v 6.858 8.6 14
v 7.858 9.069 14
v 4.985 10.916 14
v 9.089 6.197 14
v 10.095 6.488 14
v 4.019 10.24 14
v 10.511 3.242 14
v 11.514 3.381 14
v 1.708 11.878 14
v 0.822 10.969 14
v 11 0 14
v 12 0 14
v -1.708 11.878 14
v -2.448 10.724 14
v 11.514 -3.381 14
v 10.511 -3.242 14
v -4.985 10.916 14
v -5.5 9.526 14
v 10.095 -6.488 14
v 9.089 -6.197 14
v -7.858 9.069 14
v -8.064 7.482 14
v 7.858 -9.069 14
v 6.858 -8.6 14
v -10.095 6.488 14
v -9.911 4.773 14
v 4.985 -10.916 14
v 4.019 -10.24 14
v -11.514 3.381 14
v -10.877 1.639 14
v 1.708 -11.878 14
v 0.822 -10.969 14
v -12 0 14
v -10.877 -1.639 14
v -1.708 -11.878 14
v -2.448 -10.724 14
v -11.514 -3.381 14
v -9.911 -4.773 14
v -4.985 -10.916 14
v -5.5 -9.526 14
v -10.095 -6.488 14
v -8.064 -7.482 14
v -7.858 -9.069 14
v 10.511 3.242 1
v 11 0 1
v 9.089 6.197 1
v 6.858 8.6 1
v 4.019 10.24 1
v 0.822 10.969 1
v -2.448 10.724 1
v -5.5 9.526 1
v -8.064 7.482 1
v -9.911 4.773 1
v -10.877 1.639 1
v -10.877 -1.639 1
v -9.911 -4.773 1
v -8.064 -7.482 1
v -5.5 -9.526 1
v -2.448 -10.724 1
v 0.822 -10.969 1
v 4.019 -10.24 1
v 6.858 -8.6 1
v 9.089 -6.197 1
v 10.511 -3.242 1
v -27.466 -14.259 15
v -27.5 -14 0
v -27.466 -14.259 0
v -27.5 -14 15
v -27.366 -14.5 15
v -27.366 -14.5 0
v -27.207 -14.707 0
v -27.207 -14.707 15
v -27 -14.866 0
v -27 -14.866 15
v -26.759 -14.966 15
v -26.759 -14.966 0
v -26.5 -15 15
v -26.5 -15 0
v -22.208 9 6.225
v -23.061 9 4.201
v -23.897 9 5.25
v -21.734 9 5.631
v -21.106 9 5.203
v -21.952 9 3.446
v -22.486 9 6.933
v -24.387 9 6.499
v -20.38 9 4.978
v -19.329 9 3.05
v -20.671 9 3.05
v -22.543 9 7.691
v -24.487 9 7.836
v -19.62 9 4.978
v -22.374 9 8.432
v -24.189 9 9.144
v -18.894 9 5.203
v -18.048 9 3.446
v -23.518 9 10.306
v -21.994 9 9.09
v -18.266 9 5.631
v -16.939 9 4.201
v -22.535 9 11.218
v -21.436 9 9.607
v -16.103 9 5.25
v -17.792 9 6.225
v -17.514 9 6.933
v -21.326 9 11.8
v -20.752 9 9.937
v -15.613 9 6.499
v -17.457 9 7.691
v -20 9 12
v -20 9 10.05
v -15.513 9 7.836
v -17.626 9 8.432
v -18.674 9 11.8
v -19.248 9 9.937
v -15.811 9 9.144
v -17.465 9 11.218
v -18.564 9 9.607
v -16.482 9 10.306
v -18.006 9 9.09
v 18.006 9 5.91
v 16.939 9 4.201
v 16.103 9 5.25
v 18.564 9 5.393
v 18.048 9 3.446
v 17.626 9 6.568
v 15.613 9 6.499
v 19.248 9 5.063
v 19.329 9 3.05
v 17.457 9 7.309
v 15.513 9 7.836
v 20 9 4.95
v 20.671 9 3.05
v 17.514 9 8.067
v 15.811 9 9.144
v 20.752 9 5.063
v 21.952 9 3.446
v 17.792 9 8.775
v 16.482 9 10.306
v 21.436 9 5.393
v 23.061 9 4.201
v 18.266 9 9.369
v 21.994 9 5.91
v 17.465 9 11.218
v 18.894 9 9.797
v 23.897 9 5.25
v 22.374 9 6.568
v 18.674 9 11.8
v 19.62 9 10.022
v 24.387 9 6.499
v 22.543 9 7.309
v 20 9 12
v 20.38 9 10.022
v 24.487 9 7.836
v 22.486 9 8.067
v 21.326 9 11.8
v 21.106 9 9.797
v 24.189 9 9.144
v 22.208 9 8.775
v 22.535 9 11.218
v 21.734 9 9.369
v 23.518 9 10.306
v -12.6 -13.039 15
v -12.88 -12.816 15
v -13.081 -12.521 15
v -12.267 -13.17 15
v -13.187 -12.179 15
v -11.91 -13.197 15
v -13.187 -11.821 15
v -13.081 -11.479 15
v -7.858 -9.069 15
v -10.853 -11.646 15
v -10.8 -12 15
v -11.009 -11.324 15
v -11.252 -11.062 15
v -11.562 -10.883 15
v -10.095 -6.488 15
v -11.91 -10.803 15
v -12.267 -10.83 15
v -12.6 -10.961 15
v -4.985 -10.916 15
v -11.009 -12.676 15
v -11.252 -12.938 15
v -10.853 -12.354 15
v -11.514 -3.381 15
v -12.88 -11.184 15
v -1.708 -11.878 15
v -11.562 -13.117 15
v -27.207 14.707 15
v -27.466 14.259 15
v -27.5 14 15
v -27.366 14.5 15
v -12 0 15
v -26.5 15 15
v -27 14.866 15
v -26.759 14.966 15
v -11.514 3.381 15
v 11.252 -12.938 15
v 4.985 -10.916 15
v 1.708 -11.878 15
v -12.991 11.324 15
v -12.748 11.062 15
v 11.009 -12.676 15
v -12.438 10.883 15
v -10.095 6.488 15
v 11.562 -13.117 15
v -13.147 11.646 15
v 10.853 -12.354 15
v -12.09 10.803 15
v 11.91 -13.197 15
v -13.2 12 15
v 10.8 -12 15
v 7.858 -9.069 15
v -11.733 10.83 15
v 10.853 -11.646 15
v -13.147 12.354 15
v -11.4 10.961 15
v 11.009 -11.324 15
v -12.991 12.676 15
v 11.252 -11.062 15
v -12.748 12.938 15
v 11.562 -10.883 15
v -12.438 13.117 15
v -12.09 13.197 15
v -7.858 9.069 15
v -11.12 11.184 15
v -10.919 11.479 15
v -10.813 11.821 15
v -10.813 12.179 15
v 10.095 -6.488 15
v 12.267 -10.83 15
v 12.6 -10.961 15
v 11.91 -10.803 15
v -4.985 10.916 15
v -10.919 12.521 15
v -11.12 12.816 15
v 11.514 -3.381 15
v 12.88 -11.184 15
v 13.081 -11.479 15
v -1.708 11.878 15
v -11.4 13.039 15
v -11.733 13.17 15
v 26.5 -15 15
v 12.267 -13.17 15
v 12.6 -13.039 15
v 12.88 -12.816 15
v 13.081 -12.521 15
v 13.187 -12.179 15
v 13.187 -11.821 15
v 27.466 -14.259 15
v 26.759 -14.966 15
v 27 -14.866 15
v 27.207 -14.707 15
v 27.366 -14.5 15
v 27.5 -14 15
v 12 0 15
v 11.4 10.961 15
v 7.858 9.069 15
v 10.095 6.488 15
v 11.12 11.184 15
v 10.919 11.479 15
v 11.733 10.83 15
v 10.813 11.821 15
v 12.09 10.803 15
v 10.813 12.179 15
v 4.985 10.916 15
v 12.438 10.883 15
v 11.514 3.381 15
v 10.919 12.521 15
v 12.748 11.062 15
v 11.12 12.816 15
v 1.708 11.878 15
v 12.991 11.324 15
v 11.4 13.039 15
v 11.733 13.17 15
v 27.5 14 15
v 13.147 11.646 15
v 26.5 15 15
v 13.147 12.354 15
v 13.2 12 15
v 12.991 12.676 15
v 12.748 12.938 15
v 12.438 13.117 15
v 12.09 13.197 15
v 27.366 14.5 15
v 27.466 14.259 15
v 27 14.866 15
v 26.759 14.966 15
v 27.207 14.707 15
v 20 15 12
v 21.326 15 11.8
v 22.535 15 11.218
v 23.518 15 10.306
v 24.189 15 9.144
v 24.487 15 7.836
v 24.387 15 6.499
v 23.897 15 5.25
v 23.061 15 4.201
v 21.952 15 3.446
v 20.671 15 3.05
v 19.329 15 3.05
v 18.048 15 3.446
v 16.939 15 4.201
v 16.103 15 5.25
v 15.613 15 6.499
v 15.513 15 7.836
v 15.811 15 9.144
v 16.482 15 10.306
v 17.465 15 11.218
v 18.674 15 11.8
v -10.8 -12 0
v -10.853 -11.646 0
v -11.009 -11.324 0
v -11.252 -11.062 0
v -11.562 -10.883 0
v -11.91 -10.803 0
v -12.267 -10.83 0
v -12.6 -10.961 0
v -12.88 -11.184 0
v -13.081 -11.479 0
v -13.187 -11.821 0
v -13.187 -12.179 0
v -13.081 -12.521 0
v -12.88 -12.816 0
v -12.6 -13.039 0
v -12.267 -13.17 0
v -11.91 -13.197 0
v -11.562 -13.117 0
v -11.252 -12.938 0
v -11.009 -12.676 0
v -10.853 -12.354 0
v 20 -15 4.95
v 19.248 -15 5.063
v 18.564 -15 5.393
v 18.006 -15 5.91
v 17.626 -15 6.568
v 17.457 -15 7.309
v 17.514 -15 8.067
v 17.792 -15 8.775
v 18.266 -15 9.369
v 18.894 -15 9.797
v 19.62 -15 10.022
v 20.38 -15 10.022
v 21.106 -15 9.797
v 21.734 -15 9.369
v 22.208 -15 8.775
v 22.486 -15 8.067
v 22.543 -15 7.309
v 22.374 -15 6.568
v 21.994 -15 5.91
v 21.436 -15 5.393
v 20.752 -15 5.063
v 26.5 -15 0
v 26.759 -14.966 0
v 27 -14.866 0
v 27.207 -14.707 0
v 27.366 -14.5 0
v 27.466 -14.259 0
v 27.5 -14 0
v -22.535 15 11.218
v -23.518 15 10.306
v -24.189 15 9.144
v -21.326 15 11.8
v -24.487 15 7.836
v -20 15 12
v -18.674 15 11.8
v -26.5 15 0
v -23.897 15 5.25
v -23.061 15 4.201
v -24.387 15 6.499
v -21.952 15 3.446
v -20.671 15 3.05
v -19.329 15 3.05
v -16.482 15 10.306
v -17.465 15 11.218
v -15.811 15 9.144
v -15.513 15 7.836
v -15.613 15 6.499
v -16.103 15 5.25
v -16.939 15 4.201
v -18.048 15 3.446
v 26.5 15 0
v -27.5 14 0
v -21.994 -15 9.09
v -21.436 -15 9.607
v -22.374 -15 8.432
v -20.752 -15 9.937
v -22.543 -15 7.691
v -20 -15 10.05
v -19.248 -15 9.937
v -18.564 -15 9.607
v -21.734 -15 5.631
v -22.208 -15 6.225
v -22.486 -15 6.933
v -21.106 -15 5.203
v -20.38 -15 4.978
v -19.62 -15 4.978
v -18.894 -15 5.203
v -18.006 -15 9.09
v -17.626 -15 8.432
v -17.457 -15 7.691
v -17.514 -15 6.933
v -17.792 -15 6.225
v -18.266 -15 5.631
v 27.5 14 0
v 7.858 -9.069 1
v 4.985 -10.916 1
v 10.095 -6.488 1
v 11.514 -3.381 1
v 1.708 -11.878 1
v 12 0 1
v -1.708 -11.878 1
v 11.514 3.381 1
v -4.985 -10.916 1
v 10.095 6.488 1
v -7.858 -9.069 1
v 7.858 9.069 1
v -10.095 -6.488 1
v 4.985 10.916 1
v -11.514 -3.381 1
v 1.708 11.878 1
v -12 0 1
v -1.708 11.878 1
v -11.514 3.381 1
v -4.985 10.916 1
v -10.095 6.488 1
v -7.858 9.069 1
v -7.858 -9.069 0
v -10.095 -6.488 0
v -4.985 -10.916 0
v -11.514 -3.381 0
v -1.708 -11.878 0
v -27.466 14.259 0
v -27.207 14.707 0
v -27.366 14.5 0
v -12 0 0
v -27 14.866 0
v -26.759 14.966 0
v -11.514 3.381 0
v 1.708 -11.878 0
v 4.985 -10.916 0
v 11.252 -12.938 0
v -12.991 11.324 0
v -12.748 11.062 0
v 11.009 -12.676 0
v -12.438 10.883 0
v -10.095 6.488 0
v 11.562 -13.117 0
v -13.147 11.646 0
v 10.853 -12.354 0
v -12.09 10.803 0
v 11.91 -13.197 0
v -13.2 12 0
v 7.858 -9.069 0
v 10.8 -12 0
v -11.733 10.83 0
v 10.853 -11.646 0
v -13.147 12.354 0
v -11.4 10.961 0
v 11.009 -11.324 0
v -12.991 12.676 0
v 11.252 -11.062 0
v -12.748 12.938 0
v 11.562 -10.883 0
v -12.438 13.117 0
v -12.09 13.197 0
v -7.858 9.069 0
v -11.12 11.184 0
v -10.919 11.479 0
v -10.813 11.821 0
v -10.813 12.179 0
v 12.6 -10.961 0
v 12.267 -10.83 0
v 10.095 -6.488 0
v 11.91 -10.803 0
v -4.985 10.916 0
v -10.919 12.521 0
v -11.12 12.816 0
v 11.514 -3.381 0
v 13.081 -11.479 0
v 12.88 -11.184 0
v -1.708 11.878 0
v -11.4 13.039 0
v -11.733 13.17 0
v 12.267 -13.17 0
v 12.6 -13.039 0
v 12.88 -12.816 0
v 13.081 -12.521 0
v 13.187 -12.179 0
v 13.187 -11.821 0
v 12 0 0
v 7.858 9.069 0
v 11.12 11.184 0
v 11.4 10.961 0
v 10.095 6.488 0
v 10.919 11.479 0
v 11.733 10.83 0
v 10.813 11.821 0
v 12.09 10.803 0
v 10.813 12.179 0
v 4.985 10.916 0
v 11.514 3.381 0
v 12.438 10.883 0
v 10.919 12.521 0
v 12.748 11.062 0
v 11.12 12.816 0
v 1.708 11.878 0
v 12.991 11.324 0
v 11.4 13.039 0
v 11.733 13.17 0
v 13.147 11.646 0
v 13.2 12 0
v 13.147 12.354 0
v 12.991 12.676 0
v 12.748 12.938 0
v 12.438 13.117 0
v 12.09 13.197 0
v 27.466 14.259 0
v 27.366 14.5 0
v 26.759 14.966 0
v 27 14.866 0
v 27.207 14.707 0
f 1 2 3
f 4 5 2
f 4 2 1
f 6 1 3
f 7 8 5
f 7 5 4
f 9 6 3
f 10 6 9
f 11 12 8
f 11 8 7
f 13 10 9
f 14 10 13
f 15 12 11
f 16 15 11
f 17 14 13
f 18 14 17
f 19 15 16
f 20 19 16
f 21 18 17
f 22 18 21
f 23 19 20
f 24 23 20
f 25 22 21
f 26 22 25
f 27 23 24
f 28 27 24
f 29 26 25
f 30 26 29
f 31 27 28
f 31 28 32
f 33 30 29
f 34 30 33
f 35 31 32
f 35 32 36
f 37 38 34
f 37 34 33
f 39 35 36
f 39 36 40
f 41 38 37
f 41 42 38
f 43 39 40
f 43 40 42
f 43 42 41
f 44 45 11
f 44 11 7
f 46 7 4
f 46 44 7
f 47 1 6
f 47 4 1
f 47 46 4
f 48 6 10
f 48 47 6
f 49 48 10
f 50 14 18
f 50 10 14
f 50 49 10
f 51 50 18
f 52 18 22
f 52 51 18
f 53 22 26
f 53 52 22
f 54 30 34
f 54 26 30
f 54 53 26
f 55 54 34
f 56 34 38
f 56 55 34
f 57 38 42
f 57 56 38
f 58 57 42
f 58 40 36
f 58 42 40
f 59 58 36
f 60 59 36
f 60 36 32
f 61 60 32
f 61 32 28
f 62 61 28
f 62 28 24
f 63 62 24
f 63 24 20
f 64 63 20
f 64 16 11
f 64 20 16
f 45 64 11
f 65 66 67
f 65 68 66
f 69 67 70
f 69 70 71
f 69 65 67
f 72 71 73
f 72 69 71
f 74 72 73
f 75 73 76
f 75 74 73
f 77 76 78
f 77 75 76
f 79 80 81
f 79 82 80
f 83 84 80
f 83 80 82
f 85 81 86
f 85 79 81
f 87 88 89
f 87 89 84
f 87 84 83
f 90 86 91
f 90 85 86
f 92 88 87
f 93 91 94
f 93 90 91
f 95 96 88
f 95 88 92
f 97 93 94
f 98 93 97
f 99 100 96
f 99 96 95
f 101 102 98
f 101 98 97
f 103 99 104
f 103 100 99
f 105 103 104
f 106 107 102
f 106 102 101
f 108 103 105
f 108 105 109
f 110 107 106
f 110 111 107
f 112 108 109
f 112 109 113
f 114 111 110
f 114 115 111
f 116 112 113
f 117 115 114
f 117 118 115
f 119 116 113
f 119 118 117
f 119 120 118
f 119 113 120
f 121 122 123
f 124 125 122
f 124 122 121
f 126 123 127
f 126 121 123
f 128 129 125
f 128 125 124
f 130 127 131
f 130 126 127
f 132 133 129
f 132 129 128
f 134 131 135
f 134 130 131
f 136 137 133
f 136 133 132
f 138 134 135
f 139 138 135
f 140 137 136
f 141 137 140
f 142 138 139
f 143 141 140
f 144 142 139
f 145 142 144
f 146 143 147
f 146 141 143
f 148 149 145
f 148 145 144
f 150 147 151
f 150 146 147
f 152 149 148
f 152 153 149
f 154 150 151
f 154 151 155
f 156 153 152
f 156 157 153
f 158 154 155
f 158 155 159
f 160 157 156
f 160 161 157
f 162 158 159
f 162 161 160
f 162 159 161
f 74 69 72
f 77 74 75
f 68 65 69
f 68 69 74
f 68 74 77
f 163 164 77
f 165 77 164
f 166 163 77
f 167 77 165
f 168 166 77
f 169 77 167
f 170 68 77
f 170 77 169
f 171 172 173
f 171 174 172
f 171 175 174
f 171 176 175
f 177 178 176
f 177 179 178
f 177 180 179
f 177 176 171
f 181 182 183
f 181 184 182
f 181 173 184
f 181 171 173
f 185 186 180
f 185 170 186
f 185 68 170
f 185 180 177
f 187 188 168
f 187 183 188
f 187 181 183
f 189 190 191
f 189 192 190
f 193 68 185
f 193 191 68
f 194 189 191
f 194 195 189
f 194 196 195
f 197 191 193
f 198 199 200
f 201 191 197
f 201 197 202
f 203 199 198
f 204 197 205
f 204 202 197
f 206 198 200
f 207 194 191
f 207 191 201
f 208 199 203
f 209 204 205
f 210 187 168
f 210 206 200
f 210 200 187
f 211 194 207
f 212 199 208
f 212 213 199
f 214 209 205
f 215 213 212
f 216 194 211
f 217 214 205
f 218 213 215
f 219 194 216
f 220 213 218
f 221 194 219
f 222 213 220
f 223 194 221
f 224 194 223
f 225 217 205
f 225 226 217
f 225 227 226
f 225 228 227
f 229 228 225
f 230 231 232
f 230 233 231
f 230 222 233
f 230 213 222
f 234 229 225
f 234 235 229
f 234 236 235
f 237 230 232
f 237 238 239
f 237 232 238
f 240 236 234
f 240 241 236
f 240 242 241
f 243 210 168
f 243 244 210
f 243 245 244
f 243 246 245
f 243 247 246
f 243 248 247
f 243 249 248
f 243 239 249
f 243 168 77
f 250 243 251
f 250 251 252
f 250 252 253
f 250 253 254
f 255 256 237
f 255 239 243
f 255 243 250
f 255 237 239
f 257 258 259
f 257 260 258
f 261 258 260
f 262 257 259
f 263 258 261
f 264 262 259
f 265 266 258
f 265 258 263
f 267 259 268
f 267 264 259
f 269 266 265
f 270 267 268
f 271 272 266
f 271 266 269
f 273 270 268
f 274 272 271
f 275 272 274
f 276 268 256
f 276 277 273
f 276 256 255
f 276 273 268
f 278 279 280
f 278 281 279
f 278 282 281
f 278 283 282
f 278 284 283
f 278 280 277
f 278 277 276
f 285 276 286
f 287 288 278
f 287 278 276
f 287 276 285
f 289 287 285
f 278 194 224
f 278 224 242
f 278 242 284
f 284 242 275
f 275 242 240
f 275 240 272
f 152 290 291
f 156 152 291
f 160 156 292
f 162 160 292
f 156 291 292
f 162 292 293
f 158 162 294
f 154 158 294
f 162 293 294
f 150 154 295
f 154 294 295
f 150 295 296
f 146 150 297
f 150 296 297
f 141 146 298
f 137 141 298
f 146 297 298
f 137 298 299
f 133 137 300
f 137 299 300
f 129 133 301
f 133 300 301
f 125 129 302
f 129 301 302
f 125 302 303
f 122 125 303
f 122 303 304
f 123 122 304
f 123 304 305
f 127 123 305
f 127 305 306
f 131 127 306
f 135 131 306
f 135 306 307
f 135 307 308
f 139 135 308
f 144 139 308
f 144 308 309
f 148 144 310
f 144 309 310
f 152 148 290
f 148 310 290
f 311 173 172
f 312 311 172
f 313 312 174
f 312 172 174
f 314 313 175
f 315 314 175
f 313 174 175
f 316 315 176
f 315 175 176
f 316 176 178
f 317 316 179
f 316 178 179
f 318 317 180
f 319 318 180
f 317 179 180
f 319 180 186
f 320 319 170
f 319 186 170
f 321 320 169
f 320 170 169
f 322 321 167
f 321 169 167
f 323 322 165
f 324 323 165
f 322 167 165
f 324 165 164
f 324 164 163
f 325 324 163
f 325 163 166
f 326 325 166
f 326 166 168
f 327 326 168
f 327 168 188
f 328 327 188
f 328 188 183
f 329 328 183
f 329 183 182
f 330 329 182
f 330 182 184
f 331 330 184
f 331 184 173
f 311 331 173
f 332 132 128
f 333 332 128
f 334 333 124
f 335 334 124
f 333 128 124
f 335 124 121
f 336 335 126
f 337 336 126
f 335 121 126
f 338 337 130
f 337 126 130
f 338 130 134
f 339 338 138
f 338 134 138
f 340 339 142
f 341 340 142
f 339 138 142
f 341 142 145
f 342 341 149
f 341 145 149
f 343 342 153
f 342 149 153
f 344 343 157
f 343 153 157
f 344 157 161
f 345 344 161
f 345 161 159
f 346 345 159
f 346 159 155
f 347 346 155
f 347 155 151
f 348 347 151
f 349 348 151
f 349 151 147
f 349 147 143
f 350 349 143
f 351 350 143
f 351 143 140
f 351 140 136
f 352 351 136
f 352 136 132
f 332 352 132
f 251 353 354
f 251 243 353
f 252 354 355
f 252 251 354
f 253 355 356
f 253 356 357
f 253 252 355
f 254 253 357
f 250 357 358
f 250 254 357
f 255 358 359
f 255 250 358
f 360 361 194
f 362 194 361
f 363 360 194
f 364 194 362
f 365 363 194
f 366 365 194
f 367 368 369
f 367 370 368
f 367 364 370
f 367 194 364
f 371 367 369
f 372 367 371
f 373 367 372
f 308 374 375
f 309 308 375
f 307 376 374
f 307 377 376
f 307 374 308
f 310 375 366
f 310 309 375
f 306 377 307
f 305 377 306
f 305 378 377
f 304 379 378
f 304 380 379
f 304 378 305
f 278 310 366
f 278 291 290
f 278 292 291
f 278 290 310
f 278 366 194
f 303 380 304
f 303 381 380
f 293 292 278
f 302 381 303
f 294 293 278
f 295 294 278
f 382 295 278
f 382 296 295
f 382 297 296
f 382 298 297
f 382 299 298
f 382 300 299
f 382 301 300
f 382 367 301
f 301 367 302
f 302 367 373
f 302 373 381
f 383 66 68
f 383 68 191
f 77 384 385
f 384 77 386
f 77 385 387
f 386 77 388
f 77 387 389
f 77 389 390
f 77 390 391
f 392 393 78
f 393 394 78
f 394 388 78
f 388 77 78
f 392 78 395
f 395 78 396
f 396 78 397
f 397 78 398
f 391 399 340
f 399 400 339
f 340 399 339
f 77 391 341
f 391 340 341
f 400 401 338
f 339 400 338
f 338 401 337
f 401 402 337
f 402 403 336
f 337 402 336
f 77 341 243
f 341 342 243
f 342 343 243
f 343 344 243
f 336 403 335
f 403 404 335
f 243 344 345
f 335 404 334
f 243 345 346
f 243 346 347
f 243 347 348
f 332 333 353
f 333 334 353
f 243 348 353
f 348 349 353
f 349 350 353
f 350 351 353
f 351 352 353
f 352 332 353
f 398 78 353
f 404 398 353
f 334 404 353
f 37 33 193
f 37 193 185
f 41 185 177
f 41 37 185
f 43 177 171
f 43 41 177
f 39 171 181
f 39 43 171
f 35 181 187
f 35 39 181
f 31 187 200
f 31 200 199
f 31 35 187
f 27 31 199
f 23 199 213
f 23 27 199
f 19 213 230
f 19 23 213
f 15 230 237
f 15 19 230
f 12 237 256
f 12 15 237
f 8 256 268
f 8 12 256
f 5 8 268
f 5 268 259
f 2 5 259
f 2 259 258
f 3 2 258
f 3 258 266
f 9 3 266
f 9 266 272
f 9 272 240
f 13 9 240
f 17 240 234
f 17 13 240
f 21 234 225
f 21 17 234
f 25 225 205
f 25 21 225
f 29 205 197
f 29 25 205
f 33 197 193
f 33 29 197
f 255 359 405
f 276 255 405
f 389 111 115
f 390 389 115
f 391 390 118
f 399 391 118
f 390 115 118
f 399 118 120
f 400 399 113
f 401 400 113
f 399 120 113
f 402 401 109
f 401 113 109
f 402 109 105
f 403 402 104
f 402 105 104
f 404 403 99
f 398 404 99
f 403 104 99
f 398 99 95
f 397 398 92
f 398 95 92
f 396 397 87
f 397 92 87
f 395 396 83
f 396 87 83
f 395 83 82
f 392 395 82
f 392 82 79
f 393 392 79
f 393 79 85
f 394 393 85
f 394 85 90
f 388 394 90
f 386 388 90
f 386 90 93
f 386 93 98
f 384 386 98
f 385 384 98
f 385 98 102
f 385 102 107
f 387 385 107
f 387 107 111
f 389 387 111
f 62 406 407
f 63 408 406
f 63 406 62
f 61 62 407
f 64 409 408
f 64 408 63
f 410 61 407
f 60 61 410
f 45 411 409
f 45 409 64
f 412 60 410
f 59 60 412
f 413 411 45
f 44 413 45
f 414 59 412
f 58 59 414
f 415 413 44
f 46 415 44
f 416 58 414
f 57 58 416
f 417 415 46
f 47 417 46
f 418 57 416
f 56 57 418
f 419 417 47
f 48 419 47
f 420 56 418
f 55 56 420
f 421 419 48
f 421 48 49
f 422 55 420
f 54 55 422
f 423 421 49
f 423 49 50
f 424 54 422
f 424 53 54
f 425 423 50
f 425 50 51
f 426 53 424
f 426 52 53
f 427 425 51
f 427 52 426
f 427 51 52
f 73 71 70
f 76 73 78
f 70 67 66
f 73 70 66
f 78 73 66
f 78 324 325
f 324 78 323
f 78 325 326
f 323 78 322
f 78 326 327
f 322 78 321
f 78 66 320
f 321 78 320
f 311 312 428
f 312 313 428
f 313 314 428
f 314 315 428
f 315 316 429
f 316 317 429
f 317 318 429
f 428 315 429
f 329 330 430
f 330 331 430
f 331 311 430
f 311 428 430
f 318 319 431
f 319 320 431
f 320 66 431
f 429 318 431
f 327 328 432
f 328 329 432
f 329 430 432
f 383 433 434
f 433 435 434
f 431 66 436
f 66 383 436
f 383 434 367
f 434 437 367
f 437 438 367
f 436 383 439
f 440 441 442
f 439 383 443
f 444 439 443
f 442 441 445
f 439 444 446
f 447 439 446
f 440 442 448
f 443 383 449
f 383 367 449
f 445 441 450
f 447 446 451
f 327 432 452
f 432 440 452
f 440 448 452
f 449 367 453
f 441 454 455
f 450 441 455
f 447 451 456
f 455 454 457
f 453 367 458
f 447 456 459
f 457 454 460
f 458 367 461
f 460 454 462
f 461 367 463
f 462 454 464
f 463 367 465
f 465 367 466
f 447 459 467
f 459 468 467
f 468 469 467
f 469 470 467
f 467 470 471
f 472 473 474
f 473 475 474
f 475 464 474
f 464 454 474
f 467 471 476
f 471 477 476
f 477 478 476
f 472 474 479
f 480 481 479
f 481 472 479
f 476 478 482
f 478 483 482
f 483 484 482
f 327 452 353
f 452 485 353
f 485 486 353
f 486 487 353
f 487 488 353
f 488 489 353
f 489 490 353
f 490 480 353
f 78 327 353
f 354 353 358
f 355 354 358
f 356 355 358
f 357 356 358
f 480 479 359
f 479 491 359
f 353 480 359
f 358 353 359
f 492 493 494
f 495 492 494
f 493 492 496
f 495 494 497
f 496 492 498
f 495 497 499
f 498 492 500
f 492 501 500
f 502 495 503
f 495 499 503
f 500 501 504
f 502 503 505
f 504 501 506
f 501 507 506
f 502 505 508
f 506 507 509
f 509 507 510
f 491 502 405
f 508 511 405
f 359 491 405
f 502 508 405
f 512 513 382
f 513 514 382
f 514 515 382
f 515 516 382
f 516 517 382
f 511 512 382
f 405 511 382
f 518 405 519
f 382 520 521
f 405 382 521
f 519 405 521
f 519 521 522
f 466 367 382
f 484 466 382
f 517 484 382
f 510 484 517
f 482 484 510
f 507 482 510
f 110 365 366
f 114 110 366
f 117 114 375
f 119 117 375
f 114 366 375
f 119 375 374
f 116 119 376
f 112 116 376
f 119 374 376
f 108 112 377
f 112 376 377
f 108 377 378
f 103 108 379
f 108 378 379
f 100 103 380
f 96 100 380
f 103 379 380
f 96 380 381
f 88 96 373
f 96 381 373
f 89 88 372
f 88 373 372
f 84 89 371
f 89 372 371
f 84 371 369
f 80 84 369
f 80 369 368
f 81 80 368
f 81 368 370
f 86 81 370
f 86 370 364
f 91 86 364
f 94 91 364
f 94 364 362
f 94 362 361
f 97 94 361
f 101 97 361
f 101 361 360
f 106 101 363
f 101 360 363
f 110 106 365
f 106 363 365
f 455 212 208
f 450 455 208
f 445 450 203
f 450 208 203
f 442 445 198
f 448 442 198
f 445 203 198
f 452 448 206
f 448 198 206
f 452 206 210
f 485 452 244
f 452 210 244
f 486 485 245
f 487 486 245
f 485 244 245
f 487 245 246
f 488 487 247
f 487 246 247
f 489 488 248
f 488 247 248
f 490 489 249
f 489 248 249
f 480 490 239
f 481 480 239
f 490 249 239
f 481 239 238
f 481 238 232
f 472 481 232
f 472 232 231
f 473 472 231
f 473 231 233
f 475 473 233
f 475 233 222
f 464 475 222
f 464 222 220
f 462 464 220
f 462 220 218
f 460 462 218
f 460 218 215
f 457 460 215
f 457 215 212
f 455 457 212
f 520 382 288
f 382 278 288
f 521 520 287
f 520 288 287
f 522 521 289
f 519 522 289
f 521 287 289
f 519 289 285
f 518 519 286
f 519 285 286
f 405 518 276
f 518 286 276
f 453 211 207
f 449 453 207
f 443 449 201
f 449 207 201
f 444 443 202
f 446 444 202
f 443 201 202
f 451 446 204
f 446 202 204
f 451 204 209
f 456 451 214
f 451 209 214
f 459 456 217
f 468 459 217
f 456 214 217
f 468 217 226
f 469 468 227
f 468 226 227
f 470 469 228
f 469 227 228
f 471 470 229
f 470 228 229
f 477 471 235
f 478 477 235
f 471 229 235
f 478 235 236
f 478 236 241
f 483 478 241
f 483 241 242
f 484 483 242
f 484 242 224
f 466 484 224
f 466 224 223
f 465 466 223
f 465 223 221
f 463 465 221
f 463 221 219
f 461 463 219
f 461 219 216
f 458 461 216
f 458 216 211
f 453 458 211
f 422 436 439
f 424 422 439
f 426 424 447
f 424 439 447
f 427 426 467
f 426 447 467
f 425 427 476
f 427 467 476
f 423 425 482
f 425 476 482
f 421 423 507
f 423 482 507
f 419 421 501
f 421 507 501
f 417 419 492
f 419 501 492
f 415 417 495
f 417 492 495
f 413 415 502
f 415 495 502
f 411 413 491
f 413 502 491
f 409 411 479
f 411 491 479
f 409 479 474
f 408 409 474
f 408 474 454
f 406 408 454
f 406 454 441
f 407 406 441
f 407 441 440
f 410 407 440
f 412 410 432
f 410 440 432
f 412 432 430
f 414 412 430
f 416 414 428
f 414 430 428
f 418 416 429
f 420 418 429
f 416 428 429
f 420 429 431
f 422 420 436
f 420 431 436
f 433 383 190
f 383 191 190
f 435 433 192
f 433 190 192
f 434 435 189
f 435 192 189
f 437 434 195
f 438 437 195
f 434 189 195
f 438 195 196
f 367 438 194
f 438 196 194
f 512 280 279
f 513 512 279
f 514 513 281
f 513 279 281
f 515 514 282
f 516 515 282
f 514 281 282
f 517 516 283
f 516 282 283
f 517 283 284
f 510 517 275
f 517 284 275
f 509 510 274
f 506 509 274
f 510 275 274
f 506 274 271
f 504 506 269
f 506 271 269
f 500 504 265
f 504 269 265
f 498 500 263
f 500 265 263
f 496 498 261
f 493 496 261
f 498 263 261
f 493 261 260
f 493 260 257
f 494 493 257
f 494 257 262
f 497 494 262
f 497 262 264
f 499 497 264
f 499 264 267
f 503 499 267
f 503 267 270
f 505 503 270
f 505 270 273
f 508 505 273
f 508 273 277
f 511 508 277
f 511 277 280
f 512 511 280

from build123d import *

# Parameters (mm, degrees)
SKETCH_1_W          = 55
SKETCH_1_H          = 30
SKETCH_1_R          = 11
EXTRUDE_1_DEPTH     = 15
SKETCH_2_R          = 2.55
CUT_EXTRUDE_1_DEPTH = 44.373378932
SKETCH_4_R          = 12
CUT_EXTRUDE_3_DEPTH = 1
CUT_EXTRUDE_START   = -1
SKETCH_5_R          = 12
CUT_EXTRUDE_4_DEPTH = 1
SKETCH_6_R          = 1.2
CUT_EXTRUDE_5_DEPTH = 35.731109974
FILLET_2_R          = 1
SKETCH_7_R          = 4.5
CUT_EXTRUDE_6_DEPTH = 6


with BuildPart() as part:
    # 草图1 → 凸台-拉伸1 (new body)
    with BuildSketch(Plane.XY):
        Rectangle(SKETCH_1_W, SKETCH_1_H)
        Circle(SKETCH_1_R, mode=Mode.SUBTRACT)
    extrude(amount=EXTRUDE_1_DEPTH)

    # 草图2 → 切除-拉伸1 (cut, through all)
    with BuildSketch(Plane(origin=(0, 15, 0), x_dir=(1, 0, 0), z_dir=(0, 1, 0))):
        with Locations(Location((-20, -7.5, 0), (0, 0, 270))):
            Circle(SKETCH_2_R)
        with Locations(Location((20, -7.5, 0), (0, 0, 90))):
            Circle(SKETCH_2_R)
    extrude(amount=-CUT_EXTRUDE_1_DEPTH, mode=Mode.SUBTRACT)

    # 草图4 → 切除-拉伸3 (cut)
    with BuildSketch(Plane(origin=(0, 0, 0), x_dir=(-1, 0, 0), z_dir=(0, 0, -1))):
        Circle(SKETCH_4_R)
    extrude(amount=-CUT_EXTRUDE_3_DEPTH, mode=Mode.SUBTRACT)

    # 草图5 → 切除-拉伸4 (cut)
    with BuildSketch(Plane.XY.offset(15).offset(CUT_EXTRUDE_START)):
        with Locations(Location((0, 0, 0), (0, 0, 180))):
            Circle(SKETCH_5_R)
    extrude(amount=CUT_EXTRUDE_4_DEPTH, mode=Mode.SUBTRACT)

    # 草图6 → 切除-拉伸5 (cut, through all)
    with BuildSketch(Plane.XY.offset(15)):
        with Locations((12, 12)):
            Circle(SKETCH_6_R)
        with Locations(Location((-12, 12, 0), (0, 0, 180))):
            Circle(SKETCH_6_R)
        with Locations((-12, -12)):
            Circle(SKETCH_6_R)
        with Locations(Location((12, -12, 0), (0, 0, 180))):
            Circle(SKETCH_6_R)
    extrude(amount=-CUT_EXTRUDE_5_DEPTH, mode=Mode.SUBTRACT)

    # 圆角2
    fillet_2_edges = [part.edges().sort_by_distance(p)[0] for p in [
        (-27.5, 15, 7.5),
        (27.5, 15, 7.5),
        (27.5, -15, 7.5),
        (-27.5, -15, 7.5),
    ]]
    fillet(fillet_2_edges, radius=FILLET_2_R)

    # 草图7 → 切除-拉伸6 (cut)
    with BuildSketch(Plane(origin=(0, 15, 0), x_dir=(1, 0, 0), z_dir=(0, 1, 0))):
        with Locations(Location((-20, -7.5, 0), (0, 0, 270))):
            Circle(SKETCH_7_R)
        with Locations(Location((20, -7.5, 0), (0, 0, 270))):
            Circle(SKETCH_7_R)
    extrude(amount=-CUT_EXTRUDE_6_DEPTH, mode=Mode.SUBTRACT)


solid = part.part
